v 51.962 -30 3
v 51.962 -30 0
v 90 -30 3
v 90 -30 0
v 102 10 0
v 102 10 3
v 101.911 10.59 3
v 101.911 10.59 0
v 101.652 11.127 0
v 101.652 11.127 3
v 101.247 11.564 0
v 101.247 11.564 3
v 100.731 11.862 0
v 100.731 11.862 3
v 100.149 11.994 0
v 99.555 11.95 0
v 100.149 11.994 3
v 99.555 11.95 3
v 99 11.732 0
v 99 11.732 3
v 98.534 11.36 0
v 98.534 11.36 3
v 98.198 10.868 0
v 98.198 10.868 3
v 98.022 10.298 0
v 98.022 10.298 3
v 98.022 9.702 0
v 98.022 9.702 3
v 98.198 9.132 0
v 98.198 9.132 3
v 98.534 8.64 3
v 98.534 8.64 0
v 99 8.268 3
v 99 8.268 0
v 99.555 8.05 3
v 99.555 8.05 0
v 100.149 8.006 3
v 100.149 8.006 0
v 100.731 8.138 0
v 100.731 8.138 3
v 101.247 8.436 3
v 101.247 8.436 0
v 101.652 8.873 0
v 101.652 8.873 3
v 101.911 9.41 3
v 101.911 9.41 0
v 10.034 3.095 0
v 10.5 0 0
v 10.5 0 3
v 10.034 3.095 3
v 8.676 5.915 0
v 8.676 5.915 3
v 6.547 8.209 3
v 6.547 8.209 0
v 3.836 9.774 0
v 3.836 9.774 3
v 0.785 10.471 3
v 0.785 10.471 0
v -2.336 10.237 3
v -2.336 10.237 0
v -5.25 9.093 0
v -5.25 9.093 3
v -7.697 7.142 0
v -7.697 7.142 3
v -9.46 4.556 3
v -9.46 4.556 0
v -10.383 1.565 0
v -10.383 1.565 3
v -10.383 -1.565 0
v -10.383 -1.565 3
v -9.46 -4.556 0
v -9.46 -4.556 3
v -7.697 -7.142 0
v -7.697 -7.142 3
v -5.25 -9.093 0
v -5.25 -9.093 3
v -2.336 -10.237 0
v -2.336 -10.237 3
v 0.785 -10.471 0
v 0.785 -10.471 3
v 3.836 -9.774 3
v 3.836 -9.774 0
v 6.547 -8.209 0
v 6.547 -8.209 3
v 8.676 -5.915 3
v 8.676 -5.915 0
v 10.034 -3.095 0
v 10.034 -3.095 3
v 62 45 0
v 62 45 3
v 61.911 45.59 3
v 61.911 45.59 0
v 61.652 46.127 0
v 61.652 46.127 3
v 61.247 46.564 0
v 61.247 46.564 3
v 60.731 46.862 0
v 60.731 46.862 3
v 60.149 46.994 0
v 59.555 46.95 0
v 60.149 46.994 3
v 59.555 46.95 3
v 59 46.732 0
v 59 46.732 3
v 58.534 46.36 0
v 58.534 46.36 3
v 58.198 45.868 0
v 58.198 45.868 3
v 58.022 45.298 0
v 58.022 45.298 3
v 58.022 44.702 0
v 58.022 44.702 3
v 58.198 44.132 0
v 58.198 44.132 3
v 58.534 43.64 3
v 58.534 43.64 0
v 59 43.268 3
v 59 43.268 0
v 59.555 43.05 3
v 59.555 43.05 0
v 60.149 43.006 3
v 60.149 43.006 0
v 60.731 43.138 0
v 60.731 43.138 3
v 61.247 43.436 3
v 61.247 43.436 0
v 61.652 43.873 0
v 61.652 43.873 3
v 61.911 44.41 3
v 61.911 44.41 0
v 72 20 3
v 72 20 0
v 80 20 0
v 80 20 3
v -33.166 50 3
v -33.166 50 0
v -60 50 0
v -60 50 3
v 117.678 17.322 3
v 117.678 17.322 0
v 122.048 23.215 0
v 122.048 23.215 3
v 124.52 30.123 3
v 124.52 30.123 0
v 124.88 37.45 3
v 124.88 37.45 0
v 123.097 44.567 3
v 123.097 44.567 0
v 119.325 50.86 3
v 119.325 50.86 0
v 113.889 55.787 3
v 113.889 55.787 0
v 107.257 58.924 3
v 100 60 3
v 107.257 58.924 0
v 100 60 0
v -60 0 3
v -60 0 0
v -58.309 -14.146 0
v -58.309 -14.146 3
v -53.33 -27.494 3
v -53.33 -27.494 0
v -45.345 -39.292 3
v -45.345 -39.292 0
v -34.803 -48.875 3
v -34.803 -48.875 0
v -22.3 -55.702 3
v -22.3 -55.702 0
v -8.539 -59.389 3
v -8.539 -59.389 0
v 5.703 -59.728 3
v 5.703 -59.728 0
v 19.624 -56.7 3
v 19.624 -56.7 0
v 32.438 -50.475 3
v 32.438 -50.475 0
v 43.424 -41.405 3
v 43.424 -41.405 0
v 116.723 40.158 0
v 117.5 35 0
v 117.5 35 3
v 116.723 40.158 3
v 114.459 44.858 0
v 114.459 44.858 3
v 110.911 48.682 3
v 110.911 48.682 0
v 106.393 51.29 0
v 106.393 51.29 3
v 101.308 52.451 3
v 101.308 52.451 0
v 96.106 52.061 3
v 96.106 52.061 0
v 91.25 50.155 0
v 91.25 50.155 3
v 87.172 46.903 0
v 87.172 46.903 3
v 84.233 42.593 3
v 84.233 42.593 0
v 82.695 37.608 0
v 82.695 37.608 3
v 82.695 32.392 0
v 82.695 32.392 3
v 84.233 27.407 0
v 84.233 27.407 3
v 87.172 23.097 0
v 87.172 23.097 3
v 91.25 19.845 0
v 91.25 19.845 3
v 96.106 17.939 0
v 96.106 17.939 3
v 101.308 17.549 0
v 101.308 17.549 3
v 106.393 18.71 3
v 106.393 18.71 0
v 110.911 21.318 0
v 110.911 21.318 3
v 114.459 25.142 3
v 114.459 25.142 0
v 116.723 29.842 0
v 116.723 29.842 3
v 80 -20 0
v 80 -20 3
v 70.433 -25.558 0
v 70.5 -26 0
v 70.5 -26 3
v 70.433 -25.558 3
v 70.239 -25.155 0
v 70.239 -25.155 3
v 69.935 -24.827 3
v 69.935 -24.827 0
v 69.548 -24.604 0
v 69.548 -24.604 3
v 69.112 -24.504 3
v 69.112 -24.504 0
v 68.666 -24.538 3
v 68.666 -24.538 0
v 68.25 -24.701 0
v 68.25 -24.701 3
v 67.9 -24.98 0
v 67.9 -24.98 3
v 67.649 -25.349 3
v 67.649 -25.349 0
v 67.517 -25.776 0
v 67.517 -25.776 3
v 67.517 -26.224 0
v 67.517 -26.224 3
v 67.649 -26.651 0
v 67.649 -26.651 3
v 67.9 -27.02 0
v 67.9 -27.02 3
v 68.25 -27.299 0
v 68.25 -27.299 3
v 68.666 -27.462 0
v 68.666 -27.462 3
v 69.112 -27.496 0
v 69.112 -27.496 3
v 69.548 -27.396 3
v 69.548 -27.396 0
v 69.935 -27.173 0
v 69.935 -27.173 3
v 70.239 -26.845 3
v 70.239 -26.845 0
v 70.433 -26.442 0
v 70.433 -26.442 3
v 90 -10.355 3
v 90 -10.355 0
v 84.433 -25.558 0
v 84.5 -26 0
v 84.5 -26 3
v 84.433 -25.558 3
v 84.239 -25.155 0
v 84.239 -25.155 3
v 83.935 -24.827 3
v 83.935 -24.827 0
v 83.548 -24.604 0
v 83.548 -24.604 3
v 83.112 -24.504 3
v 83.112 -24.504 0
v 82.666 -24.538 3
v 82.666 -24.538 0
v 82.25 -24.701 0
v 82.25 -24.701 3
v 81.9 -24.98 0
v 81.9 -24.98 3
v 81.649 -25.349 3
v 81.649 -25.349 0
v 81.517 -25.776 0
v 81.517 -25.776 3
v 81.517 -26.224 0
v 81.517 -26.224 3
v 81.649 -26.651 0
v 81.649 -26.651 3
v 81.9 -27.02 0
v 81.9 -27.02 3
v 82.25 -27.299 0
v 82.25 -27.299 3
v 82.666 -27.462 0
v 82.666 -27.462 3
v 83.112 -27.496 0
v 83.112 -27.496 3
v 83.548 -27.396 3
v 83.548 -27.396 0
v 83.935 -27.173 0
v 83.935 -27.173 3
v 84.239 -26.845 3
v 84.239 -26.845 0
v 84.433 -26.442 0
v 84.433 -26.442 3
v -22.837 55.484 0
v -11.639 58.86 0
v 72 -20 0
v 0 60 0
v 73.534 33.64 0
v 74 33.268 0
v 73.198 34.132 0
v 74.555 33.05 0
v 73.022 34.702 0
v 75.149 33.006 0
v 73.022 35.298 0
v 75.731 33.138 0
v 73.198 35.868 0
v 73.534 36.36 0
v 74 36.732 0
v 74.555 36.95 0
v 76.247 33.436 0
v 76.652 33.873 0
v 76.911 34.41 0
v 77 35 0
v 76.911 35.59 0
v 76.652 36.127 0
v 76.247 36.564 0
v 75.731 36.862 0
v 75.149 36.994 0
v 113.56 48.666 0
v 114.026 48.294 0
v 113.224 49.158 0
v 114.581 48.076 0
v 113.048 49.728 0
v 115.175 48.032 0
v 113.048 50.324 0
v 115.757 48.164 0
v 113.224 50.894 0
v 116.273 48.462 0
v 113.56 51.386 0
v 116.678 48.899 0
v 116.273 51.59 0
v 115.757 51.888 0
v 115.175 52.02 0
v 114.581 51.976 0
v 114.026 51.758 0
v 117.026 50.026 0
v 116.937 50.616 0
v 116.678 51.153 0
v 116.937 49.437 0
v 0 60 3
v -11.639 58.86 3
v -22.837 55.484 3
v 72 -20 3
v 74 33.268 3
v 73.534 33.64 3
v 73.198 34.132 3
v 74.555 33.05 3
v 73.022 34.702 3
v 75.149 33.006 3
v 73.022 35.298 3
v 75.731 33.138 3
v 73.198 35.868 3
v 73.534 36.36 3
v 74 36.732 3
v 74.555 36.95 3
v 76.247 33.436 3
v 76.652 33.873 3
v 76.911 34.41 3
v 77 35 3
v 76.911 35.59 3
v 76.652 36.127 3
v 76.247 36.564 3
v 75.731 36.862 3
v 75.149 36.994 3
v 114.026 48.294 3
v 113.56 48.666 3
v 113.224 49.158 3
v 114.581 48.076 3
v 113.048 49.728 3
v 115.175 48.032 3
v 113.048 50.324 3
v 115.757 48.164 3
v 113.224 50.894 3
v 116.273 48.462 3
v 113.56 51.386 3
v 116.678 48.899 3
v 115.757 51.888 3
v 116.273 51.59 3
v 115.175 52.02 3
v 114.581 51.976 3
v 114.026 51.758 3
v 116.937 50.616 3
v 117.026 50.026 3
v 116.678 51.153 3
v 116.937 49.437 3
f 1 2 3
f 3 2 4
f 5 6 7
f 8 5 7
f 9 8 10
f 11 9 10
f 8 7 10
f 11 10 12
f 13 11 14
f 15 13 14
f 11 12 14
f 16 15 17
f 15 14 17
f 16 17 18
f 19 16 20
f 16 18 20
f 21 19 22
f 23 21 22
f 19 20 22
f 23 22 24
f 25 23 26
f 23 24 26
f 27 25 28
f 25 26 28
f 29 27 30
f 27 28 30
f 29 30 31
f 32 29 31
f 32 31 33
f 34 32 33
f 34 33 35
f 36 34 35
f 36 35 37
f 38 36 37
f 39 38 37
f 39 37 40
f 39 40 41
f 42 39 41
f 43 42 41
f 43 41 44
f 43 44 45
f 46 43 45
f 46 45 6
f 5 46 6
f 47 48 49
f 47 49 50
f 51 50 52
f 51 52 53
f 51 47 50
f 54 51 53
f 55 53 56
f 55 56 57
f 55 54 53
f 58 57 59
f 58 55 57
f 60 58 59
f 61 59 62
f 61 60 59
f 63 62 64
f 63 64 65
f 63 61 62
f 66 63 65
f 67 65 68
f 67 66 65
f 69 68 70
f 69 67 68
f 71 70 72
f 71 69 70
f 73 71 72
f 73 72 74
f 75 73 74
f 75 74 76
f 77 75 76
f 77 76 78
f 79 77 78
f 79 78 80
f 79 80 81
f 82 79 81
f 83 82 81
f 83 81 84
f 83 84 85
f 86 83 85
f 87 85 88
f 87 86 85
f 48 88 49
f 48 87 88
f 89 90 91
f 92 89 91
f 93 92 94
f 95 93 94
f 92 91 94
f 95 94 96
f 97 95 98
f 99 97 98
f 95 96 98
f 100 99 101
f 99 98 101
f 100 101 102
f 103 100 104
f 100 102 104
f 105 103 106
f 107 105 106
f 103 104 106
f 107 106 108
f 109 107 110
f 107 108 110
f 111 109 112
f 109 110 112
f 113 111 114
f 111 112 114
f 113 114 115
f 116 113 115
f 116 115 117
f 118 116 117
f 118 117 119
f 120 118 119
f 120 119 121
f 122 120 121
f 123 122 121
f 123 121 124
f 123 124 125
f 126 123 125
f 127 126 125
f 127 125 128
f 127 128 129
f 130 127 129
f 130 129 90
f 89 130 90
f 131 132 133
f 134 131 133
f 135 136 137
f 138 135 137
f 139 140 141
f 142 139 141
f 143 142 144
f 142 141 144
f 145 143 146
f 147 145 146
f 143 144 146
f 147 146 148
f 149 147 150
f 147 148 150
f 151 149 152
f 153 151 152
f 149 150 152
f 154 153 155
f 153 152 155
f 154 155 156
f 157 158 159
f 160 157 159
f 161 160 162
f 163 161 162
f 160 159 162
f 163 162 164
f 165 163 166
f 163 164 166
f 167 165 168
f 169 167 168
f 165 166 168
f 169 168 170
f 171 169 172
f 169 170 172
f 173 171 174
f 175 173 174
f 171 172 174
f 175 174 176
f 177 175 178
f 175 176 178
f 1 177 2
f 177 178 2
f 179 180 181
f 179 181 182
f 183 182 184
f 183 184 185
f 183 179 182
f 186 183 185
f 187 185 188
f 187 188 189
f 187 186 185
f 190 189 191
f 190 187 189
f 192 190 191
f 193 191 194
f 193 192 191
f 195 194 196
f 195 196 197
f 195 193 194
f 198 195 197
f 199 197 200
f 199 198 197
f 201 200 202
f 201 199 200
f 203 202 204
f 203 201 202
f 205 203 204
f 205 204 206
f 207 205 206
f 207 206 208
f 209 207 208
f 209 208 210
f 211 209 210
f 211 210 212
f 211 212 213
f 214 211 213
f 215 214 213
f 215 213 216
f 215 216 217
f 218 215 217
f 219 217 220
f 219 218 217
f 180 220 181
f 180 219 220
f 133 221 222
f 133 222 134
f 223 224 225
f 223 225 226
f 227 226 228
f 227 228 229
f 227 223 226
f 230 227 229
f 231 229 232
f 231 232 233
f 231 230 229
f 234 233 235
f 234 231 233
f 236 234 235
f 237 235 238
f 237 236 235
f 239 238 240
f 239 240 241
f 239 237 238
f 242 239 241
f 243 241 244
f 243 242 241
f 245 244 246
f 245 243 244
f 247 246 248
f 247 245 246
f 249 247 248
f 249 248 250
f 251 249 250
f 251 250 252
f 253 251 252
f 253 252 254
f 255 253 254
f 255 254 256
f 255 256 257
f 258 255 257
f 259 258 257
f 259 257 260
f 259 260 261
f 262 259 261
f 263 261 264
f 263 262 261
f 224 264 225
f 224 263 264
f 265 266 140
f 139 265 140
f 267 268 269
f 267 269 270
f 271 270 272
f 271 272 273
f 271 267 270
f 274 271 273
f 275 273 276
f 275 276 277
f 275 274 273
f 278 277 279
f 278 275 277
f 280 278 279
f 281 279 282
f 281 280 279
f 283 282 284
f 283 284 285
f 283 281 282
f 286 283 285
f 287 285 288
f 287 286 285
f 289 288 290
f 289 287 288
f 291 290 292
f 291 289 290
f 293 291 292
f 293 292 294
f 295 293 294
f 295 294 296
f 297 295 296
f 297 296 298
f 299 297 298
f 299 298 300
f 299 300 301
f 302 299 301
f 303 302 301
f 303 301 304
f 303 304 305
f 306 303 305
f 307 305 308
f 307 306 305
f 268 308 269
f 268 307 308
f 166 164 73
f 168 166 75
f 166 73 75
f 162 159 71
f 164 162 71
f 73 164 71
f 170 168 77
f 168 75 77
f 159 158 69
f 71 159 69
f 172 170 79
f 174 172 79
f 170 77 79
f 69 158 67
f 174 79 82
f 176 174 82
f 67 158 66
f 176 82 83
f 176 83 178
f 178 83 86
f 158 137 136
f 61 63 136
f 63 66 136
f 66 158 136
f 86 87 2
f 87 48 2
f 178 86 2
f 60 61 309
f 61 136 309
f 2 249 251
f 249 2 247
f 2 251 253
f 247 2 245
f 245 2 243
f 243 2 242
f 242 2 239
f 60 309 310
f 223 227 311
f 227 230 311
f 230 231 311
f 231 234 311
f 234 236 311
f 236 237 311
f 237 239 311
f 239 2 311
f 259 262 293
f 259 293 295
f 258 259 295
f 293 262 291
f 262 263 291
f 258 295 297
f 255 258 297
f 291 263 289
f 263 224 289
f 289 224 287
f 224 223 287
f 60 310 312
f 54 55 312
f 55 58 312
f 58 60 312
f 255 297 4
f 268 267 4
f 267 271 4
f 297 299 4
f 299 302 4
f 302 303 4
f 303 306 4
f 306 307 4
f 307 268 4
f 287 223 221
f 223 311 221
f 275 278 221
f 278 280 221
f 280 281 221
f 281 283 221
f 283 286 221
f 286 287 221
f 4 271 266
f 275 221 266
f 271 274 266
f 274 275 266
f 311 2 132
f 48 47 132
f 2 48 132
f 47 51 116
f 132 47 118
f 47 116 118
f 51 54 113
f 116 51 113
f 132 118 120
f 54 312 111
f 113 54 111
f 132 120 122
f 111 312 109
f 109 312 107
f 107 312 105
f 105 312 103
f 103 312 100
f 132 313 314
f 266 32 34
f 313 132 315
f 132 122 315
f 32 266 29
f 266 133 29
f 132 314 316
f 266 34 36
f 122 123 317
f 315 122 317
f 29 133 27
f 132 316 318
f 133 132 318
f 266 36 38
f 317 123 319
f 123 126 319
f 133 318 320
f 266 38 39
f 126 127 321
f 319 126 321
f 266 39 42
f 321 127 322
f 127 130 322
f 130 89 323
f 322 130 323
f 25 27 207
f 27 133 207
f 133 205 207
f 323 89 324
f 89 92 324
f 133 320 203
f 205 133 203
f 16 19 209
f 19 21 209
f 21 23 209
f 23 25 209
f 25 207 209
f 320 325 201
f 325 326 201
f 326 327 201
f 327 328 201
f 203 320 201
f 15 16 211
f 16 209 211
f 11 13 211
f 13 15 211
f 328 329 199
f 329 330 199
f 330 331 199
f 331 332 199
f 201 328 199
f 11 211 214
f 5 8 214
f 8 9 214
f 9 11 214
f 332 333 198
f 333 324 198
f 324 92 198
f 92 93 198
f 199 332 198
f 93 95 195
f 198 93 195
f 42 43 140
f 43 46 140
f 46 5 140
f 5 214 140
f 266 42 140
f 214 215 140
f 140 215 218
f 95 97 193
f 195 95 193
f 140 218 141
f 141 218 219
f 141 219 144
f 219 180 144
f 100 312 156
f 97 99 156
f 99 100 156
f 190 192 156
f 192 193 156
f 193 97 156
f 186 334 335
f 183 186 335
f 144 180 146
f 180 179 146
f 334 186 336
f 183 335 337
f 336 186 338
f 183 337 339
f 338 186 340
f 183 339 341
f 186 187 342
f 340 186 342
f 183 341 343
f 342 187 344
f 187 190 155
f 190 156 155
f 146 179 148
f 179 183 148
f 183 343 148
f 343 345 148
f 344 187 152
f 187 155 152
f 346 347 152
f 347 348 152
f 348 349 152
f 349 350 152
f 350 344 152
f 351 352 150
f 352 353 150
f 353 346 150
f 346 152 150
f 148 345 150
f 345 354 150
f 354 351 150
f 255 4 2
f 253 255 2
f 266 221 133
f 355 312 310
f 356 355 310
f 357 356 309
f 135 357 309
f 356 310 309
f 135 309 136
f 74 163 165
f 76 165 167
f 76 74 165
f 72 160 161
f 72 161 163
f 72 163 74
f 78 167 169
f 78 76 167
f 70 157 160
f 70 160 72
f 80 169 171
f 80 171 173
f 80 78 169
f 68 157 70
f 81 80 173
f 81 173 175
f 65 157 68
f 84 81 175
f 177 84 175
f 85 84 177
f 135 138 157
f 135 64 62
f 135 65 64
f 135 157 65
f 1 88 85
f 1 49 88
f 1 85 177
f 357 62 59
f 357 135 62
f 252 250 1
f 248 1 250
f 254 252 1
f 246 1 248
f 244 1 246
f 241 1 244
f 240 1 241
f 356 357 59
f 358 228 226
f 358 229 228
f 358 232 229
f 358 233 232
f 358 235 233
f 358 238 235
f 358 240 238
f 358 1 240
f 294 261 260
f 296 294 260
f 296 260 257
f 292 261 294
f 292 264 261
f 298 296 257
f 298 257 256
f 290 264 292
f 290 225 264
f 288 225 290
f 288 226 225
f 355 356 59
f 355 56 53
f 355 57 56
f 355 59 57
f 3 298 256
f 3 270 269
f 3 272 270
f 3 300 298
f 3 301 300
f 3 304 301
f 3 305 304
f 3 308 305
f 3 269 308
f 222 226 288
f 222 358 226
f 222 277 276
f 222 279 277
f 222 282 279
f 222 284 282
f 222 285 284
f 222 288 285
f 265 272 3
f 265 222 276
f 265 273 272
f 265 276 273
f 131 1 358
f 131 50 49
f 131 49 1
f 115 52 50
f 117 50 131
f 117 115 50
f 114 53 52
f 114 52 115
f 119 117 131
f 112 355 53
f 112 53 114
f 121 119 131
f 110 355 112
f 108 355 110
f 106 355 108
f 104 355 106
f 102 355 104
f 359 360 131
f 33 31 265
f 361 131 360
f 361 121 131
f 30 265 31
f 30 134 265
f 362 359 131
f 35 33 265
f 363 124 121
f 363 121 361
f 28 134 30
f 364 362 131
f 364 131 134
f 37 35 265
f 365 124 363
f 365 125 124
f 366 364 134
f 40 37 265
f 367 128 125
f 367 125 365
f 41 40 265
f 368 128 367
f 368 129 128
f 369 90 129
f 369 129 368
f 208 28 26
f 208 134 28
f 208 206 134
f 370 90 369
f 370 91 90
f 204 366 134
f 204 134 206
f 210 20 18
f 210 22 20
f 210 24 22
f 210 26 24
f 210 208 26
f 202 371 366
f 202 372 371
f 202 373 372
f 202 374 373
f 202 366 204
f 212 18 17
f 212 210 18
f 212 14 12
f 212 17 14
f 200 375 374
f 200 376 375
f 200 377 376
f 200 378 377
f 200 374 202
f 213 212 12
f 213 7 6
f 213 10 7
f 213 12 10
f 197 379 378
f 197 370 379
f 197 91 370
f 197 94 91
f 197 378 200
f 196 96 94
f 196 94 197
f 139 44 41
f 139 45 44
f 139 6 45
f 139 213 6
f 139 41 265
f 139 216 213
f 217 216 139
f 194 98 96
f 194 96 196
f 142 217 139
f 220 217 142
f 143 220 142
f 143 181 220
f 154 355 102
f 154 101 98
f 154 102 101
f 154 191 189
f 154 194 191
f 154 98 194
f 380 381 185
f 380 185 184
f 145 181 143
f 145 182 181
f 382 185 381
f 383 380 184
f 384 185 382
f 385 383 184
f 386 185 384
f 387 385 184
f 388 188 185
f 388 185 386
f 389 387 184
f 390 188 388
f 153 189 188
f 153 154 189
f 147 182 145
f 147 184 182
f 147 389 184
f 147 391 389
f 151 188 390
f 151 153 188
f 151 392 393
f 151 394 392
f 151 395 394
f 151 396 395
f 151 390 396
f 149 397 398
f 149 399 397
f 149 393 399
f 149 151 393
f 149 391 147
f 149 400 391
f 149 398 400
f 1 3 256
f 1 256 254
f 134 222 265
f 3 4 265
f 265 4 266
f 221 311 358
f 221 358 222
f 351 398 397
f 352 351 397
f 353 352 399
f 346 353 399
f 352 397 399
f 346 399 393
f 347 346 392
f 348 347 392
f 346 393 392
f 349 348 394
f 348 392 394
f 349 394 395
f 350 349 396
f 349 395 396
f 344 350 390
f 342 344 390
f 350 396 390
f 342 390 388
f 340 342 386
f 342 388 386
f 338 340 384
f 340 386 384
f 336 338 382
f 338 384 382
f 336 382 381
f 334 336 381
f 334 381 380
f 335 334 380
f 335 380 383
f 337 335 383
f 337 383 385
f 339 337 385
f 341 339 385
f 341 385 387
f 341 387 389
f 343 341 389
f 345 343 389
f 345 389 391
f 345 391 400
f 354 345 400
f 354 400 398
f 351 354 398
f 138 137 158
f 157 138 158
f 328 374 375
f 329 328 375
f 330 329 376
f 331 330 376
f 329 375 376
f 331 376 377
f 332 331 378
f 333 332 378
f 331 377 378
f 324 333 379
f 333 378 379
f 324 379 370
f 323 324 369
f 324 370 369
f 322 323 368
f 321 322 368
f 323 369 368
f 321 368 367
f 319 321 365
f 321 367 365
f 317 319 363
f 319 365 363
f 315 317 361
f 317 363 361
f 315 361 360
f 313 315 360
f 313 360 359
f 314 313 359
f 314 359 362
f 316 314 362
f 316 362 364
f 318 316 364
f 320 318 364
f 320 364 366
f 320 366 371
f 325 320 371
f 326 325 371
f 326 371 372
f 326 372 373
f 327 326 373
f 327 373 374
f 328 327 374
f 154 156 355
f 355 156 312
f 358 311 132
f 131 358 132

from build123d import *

# Parameters (mm, degrees)
SKETCH1_R           = 10.5
SKETCH1_R_2         = 1.5
SKETCH1_W           = 8
SKETCH1_H           = 40
SKETCH1_R_3         = 17.5
BOSS_EXTRUDE1_DEPTH = 3
CUT_EXTRUDE1_REACH  = 140.687
SKETCH2_R           = 2
CUT_EXTRUDE2_REACH  = 140.687
SKETCH3_R           = 2


with BuildPart() as part:
    # Sketch1 → Boss-Extrude1 (new body)
    # profile 1 of 2: a face of its own
    with BuildSketch(Plane.XY):
        with BuildLine():
            ThreePointArc((-60, 0), (-52.867640737, 28.372743309), (-33.166247904, 50))
            Line((-33.166247904, 50), (-60, 50))
            Line((-60, 50), (-60, 0))
        make_face()
    # profile 2 of 2: a face of its own
    with BuildSketch(Plane.XY):
        with BuildLine():
            ThreePointArc((0, 60), (-17.320508076, 57.445626465), (-33.166247904, 50))
            ThreePointArc((-33.166247904, 50), (-52.867640737, 28.372743309), (-60, 0))
            ThreePointArc((-60, 0), (-15.529142706, -57.955549577), (51.961524227, -30))
            Line((51.961524227, -30), (56.568542495, -30))
            Line((56.568542495, -30), (90, -30))
            Line((90, -30), (90, -10.355339059))
            Line((90, -10.355339059), (117.67766953, 17.32233047))
            ThreePointArc((117.67766953, 17.32233047), (123.096988313, 44.567085809), (100, 60))
            Line((100, 60), (0, 60))
        make_face()
        Circle(SKETCH1_R, mode=Mode.SUBTRACT)
        with Locations((69, -26)):
            Circle(SKETCH1_R_2, mode=Mode.SUBTRACT)
        with Locations((76, 0)):
            Rectangle(SKETCH1_W, SKETCH1_H, mode=Mode.SUBTRACT)
        with Locations((83, -26)):
            Circle(SKETCH1_R_2, mode=Mode.SUBTRACT)
        with Locations((100, 35)):
            Circle(SKETCH1_R_3, mode=Mode.SUBTRACT)
    extrude(amount=BOSS_EXTRUDE1_DEPTH)

    # Sketch2 → Cut-Extrude1 (cut, up to next)
    with BuildSketch(Plane.XY.offset(3), mode=Mode.PRIVATE) as cut_extrude1_sk1:
        with Locations((60, 45)):
            Circle(SKETCH2_R)
    cut_extrude1_tool1 = extrude(cut_extrude1_sk1.sketch, amount=-CUT_EXTRUDE1_REACH, mode=Mode.PRIVATE) & part.part
    add(cut_extrude1_tool1.solids().sort_by_distance((60, 45, 3))[0], mode=Mode.SUBTRACT)

    # Sketch3 → Cut-Extrude2 (cut, up to next)
    with BuildSketch(Plane.XY.offset(3), mode=Mode.PRIVATE) as cut_extrude2_sk1:
        with Locations((100, 10)):
            Circle(SKETCH3_R)
    cut_extrude2_tool1 = extrude(cut_extrude2_sk1.sketch, amount=-CUT_EXTRUDE2_REACH, mode=Mode.PRIVATE) & part.part
    # Sketch3 → Cut-Extrude2 (cut, up to next)
    with BuildSketch(Plane.XY.offset(3), mode=Mode.PRIVATE) as cut_extrude2_sk2:
        with Locations((75, 35)):
            Circle(SKETCH3_R)
    cut_extrude2_tool2 = extrude(cut_extrude2_sk2.sketch, amount=-CUT_EXTRUDE2_REACH, mode=Mode.PRIVATE) & part.part
    # Sketch3 → Cut-Extrude2 (cut, up to next)
    with BuildSketch(Plane.XY.offset(3), mode=Mode.PRIVATE) as cut_extrude2_sk3:
        with Locations((115.0260191, 50.0260191)):
            Circle(SKETCH3_R)
    cut_extrude2_tool3 = extrude(cut_extrude2_sk3.sketch, amount=-CUT_EXTRUDE2_REACH, mode=Mode.PRIVATE) & part.part
    add(cut_extrude2_tool1.solids().sort_by_distance((100, 10, 3))[0], mode=Mode.SUBTRACT)
    add(cut_extrude2_tool2.solids().sort_by_distance((75, 35, 3))[0], mode=Mode.SUBTRACT)
    add(cut_extrude2_tool3.solids().sort_by_distance((115.026019, 50.026019, 3))[0], mode=Mode.SUBTRACT)


solid = part.part
